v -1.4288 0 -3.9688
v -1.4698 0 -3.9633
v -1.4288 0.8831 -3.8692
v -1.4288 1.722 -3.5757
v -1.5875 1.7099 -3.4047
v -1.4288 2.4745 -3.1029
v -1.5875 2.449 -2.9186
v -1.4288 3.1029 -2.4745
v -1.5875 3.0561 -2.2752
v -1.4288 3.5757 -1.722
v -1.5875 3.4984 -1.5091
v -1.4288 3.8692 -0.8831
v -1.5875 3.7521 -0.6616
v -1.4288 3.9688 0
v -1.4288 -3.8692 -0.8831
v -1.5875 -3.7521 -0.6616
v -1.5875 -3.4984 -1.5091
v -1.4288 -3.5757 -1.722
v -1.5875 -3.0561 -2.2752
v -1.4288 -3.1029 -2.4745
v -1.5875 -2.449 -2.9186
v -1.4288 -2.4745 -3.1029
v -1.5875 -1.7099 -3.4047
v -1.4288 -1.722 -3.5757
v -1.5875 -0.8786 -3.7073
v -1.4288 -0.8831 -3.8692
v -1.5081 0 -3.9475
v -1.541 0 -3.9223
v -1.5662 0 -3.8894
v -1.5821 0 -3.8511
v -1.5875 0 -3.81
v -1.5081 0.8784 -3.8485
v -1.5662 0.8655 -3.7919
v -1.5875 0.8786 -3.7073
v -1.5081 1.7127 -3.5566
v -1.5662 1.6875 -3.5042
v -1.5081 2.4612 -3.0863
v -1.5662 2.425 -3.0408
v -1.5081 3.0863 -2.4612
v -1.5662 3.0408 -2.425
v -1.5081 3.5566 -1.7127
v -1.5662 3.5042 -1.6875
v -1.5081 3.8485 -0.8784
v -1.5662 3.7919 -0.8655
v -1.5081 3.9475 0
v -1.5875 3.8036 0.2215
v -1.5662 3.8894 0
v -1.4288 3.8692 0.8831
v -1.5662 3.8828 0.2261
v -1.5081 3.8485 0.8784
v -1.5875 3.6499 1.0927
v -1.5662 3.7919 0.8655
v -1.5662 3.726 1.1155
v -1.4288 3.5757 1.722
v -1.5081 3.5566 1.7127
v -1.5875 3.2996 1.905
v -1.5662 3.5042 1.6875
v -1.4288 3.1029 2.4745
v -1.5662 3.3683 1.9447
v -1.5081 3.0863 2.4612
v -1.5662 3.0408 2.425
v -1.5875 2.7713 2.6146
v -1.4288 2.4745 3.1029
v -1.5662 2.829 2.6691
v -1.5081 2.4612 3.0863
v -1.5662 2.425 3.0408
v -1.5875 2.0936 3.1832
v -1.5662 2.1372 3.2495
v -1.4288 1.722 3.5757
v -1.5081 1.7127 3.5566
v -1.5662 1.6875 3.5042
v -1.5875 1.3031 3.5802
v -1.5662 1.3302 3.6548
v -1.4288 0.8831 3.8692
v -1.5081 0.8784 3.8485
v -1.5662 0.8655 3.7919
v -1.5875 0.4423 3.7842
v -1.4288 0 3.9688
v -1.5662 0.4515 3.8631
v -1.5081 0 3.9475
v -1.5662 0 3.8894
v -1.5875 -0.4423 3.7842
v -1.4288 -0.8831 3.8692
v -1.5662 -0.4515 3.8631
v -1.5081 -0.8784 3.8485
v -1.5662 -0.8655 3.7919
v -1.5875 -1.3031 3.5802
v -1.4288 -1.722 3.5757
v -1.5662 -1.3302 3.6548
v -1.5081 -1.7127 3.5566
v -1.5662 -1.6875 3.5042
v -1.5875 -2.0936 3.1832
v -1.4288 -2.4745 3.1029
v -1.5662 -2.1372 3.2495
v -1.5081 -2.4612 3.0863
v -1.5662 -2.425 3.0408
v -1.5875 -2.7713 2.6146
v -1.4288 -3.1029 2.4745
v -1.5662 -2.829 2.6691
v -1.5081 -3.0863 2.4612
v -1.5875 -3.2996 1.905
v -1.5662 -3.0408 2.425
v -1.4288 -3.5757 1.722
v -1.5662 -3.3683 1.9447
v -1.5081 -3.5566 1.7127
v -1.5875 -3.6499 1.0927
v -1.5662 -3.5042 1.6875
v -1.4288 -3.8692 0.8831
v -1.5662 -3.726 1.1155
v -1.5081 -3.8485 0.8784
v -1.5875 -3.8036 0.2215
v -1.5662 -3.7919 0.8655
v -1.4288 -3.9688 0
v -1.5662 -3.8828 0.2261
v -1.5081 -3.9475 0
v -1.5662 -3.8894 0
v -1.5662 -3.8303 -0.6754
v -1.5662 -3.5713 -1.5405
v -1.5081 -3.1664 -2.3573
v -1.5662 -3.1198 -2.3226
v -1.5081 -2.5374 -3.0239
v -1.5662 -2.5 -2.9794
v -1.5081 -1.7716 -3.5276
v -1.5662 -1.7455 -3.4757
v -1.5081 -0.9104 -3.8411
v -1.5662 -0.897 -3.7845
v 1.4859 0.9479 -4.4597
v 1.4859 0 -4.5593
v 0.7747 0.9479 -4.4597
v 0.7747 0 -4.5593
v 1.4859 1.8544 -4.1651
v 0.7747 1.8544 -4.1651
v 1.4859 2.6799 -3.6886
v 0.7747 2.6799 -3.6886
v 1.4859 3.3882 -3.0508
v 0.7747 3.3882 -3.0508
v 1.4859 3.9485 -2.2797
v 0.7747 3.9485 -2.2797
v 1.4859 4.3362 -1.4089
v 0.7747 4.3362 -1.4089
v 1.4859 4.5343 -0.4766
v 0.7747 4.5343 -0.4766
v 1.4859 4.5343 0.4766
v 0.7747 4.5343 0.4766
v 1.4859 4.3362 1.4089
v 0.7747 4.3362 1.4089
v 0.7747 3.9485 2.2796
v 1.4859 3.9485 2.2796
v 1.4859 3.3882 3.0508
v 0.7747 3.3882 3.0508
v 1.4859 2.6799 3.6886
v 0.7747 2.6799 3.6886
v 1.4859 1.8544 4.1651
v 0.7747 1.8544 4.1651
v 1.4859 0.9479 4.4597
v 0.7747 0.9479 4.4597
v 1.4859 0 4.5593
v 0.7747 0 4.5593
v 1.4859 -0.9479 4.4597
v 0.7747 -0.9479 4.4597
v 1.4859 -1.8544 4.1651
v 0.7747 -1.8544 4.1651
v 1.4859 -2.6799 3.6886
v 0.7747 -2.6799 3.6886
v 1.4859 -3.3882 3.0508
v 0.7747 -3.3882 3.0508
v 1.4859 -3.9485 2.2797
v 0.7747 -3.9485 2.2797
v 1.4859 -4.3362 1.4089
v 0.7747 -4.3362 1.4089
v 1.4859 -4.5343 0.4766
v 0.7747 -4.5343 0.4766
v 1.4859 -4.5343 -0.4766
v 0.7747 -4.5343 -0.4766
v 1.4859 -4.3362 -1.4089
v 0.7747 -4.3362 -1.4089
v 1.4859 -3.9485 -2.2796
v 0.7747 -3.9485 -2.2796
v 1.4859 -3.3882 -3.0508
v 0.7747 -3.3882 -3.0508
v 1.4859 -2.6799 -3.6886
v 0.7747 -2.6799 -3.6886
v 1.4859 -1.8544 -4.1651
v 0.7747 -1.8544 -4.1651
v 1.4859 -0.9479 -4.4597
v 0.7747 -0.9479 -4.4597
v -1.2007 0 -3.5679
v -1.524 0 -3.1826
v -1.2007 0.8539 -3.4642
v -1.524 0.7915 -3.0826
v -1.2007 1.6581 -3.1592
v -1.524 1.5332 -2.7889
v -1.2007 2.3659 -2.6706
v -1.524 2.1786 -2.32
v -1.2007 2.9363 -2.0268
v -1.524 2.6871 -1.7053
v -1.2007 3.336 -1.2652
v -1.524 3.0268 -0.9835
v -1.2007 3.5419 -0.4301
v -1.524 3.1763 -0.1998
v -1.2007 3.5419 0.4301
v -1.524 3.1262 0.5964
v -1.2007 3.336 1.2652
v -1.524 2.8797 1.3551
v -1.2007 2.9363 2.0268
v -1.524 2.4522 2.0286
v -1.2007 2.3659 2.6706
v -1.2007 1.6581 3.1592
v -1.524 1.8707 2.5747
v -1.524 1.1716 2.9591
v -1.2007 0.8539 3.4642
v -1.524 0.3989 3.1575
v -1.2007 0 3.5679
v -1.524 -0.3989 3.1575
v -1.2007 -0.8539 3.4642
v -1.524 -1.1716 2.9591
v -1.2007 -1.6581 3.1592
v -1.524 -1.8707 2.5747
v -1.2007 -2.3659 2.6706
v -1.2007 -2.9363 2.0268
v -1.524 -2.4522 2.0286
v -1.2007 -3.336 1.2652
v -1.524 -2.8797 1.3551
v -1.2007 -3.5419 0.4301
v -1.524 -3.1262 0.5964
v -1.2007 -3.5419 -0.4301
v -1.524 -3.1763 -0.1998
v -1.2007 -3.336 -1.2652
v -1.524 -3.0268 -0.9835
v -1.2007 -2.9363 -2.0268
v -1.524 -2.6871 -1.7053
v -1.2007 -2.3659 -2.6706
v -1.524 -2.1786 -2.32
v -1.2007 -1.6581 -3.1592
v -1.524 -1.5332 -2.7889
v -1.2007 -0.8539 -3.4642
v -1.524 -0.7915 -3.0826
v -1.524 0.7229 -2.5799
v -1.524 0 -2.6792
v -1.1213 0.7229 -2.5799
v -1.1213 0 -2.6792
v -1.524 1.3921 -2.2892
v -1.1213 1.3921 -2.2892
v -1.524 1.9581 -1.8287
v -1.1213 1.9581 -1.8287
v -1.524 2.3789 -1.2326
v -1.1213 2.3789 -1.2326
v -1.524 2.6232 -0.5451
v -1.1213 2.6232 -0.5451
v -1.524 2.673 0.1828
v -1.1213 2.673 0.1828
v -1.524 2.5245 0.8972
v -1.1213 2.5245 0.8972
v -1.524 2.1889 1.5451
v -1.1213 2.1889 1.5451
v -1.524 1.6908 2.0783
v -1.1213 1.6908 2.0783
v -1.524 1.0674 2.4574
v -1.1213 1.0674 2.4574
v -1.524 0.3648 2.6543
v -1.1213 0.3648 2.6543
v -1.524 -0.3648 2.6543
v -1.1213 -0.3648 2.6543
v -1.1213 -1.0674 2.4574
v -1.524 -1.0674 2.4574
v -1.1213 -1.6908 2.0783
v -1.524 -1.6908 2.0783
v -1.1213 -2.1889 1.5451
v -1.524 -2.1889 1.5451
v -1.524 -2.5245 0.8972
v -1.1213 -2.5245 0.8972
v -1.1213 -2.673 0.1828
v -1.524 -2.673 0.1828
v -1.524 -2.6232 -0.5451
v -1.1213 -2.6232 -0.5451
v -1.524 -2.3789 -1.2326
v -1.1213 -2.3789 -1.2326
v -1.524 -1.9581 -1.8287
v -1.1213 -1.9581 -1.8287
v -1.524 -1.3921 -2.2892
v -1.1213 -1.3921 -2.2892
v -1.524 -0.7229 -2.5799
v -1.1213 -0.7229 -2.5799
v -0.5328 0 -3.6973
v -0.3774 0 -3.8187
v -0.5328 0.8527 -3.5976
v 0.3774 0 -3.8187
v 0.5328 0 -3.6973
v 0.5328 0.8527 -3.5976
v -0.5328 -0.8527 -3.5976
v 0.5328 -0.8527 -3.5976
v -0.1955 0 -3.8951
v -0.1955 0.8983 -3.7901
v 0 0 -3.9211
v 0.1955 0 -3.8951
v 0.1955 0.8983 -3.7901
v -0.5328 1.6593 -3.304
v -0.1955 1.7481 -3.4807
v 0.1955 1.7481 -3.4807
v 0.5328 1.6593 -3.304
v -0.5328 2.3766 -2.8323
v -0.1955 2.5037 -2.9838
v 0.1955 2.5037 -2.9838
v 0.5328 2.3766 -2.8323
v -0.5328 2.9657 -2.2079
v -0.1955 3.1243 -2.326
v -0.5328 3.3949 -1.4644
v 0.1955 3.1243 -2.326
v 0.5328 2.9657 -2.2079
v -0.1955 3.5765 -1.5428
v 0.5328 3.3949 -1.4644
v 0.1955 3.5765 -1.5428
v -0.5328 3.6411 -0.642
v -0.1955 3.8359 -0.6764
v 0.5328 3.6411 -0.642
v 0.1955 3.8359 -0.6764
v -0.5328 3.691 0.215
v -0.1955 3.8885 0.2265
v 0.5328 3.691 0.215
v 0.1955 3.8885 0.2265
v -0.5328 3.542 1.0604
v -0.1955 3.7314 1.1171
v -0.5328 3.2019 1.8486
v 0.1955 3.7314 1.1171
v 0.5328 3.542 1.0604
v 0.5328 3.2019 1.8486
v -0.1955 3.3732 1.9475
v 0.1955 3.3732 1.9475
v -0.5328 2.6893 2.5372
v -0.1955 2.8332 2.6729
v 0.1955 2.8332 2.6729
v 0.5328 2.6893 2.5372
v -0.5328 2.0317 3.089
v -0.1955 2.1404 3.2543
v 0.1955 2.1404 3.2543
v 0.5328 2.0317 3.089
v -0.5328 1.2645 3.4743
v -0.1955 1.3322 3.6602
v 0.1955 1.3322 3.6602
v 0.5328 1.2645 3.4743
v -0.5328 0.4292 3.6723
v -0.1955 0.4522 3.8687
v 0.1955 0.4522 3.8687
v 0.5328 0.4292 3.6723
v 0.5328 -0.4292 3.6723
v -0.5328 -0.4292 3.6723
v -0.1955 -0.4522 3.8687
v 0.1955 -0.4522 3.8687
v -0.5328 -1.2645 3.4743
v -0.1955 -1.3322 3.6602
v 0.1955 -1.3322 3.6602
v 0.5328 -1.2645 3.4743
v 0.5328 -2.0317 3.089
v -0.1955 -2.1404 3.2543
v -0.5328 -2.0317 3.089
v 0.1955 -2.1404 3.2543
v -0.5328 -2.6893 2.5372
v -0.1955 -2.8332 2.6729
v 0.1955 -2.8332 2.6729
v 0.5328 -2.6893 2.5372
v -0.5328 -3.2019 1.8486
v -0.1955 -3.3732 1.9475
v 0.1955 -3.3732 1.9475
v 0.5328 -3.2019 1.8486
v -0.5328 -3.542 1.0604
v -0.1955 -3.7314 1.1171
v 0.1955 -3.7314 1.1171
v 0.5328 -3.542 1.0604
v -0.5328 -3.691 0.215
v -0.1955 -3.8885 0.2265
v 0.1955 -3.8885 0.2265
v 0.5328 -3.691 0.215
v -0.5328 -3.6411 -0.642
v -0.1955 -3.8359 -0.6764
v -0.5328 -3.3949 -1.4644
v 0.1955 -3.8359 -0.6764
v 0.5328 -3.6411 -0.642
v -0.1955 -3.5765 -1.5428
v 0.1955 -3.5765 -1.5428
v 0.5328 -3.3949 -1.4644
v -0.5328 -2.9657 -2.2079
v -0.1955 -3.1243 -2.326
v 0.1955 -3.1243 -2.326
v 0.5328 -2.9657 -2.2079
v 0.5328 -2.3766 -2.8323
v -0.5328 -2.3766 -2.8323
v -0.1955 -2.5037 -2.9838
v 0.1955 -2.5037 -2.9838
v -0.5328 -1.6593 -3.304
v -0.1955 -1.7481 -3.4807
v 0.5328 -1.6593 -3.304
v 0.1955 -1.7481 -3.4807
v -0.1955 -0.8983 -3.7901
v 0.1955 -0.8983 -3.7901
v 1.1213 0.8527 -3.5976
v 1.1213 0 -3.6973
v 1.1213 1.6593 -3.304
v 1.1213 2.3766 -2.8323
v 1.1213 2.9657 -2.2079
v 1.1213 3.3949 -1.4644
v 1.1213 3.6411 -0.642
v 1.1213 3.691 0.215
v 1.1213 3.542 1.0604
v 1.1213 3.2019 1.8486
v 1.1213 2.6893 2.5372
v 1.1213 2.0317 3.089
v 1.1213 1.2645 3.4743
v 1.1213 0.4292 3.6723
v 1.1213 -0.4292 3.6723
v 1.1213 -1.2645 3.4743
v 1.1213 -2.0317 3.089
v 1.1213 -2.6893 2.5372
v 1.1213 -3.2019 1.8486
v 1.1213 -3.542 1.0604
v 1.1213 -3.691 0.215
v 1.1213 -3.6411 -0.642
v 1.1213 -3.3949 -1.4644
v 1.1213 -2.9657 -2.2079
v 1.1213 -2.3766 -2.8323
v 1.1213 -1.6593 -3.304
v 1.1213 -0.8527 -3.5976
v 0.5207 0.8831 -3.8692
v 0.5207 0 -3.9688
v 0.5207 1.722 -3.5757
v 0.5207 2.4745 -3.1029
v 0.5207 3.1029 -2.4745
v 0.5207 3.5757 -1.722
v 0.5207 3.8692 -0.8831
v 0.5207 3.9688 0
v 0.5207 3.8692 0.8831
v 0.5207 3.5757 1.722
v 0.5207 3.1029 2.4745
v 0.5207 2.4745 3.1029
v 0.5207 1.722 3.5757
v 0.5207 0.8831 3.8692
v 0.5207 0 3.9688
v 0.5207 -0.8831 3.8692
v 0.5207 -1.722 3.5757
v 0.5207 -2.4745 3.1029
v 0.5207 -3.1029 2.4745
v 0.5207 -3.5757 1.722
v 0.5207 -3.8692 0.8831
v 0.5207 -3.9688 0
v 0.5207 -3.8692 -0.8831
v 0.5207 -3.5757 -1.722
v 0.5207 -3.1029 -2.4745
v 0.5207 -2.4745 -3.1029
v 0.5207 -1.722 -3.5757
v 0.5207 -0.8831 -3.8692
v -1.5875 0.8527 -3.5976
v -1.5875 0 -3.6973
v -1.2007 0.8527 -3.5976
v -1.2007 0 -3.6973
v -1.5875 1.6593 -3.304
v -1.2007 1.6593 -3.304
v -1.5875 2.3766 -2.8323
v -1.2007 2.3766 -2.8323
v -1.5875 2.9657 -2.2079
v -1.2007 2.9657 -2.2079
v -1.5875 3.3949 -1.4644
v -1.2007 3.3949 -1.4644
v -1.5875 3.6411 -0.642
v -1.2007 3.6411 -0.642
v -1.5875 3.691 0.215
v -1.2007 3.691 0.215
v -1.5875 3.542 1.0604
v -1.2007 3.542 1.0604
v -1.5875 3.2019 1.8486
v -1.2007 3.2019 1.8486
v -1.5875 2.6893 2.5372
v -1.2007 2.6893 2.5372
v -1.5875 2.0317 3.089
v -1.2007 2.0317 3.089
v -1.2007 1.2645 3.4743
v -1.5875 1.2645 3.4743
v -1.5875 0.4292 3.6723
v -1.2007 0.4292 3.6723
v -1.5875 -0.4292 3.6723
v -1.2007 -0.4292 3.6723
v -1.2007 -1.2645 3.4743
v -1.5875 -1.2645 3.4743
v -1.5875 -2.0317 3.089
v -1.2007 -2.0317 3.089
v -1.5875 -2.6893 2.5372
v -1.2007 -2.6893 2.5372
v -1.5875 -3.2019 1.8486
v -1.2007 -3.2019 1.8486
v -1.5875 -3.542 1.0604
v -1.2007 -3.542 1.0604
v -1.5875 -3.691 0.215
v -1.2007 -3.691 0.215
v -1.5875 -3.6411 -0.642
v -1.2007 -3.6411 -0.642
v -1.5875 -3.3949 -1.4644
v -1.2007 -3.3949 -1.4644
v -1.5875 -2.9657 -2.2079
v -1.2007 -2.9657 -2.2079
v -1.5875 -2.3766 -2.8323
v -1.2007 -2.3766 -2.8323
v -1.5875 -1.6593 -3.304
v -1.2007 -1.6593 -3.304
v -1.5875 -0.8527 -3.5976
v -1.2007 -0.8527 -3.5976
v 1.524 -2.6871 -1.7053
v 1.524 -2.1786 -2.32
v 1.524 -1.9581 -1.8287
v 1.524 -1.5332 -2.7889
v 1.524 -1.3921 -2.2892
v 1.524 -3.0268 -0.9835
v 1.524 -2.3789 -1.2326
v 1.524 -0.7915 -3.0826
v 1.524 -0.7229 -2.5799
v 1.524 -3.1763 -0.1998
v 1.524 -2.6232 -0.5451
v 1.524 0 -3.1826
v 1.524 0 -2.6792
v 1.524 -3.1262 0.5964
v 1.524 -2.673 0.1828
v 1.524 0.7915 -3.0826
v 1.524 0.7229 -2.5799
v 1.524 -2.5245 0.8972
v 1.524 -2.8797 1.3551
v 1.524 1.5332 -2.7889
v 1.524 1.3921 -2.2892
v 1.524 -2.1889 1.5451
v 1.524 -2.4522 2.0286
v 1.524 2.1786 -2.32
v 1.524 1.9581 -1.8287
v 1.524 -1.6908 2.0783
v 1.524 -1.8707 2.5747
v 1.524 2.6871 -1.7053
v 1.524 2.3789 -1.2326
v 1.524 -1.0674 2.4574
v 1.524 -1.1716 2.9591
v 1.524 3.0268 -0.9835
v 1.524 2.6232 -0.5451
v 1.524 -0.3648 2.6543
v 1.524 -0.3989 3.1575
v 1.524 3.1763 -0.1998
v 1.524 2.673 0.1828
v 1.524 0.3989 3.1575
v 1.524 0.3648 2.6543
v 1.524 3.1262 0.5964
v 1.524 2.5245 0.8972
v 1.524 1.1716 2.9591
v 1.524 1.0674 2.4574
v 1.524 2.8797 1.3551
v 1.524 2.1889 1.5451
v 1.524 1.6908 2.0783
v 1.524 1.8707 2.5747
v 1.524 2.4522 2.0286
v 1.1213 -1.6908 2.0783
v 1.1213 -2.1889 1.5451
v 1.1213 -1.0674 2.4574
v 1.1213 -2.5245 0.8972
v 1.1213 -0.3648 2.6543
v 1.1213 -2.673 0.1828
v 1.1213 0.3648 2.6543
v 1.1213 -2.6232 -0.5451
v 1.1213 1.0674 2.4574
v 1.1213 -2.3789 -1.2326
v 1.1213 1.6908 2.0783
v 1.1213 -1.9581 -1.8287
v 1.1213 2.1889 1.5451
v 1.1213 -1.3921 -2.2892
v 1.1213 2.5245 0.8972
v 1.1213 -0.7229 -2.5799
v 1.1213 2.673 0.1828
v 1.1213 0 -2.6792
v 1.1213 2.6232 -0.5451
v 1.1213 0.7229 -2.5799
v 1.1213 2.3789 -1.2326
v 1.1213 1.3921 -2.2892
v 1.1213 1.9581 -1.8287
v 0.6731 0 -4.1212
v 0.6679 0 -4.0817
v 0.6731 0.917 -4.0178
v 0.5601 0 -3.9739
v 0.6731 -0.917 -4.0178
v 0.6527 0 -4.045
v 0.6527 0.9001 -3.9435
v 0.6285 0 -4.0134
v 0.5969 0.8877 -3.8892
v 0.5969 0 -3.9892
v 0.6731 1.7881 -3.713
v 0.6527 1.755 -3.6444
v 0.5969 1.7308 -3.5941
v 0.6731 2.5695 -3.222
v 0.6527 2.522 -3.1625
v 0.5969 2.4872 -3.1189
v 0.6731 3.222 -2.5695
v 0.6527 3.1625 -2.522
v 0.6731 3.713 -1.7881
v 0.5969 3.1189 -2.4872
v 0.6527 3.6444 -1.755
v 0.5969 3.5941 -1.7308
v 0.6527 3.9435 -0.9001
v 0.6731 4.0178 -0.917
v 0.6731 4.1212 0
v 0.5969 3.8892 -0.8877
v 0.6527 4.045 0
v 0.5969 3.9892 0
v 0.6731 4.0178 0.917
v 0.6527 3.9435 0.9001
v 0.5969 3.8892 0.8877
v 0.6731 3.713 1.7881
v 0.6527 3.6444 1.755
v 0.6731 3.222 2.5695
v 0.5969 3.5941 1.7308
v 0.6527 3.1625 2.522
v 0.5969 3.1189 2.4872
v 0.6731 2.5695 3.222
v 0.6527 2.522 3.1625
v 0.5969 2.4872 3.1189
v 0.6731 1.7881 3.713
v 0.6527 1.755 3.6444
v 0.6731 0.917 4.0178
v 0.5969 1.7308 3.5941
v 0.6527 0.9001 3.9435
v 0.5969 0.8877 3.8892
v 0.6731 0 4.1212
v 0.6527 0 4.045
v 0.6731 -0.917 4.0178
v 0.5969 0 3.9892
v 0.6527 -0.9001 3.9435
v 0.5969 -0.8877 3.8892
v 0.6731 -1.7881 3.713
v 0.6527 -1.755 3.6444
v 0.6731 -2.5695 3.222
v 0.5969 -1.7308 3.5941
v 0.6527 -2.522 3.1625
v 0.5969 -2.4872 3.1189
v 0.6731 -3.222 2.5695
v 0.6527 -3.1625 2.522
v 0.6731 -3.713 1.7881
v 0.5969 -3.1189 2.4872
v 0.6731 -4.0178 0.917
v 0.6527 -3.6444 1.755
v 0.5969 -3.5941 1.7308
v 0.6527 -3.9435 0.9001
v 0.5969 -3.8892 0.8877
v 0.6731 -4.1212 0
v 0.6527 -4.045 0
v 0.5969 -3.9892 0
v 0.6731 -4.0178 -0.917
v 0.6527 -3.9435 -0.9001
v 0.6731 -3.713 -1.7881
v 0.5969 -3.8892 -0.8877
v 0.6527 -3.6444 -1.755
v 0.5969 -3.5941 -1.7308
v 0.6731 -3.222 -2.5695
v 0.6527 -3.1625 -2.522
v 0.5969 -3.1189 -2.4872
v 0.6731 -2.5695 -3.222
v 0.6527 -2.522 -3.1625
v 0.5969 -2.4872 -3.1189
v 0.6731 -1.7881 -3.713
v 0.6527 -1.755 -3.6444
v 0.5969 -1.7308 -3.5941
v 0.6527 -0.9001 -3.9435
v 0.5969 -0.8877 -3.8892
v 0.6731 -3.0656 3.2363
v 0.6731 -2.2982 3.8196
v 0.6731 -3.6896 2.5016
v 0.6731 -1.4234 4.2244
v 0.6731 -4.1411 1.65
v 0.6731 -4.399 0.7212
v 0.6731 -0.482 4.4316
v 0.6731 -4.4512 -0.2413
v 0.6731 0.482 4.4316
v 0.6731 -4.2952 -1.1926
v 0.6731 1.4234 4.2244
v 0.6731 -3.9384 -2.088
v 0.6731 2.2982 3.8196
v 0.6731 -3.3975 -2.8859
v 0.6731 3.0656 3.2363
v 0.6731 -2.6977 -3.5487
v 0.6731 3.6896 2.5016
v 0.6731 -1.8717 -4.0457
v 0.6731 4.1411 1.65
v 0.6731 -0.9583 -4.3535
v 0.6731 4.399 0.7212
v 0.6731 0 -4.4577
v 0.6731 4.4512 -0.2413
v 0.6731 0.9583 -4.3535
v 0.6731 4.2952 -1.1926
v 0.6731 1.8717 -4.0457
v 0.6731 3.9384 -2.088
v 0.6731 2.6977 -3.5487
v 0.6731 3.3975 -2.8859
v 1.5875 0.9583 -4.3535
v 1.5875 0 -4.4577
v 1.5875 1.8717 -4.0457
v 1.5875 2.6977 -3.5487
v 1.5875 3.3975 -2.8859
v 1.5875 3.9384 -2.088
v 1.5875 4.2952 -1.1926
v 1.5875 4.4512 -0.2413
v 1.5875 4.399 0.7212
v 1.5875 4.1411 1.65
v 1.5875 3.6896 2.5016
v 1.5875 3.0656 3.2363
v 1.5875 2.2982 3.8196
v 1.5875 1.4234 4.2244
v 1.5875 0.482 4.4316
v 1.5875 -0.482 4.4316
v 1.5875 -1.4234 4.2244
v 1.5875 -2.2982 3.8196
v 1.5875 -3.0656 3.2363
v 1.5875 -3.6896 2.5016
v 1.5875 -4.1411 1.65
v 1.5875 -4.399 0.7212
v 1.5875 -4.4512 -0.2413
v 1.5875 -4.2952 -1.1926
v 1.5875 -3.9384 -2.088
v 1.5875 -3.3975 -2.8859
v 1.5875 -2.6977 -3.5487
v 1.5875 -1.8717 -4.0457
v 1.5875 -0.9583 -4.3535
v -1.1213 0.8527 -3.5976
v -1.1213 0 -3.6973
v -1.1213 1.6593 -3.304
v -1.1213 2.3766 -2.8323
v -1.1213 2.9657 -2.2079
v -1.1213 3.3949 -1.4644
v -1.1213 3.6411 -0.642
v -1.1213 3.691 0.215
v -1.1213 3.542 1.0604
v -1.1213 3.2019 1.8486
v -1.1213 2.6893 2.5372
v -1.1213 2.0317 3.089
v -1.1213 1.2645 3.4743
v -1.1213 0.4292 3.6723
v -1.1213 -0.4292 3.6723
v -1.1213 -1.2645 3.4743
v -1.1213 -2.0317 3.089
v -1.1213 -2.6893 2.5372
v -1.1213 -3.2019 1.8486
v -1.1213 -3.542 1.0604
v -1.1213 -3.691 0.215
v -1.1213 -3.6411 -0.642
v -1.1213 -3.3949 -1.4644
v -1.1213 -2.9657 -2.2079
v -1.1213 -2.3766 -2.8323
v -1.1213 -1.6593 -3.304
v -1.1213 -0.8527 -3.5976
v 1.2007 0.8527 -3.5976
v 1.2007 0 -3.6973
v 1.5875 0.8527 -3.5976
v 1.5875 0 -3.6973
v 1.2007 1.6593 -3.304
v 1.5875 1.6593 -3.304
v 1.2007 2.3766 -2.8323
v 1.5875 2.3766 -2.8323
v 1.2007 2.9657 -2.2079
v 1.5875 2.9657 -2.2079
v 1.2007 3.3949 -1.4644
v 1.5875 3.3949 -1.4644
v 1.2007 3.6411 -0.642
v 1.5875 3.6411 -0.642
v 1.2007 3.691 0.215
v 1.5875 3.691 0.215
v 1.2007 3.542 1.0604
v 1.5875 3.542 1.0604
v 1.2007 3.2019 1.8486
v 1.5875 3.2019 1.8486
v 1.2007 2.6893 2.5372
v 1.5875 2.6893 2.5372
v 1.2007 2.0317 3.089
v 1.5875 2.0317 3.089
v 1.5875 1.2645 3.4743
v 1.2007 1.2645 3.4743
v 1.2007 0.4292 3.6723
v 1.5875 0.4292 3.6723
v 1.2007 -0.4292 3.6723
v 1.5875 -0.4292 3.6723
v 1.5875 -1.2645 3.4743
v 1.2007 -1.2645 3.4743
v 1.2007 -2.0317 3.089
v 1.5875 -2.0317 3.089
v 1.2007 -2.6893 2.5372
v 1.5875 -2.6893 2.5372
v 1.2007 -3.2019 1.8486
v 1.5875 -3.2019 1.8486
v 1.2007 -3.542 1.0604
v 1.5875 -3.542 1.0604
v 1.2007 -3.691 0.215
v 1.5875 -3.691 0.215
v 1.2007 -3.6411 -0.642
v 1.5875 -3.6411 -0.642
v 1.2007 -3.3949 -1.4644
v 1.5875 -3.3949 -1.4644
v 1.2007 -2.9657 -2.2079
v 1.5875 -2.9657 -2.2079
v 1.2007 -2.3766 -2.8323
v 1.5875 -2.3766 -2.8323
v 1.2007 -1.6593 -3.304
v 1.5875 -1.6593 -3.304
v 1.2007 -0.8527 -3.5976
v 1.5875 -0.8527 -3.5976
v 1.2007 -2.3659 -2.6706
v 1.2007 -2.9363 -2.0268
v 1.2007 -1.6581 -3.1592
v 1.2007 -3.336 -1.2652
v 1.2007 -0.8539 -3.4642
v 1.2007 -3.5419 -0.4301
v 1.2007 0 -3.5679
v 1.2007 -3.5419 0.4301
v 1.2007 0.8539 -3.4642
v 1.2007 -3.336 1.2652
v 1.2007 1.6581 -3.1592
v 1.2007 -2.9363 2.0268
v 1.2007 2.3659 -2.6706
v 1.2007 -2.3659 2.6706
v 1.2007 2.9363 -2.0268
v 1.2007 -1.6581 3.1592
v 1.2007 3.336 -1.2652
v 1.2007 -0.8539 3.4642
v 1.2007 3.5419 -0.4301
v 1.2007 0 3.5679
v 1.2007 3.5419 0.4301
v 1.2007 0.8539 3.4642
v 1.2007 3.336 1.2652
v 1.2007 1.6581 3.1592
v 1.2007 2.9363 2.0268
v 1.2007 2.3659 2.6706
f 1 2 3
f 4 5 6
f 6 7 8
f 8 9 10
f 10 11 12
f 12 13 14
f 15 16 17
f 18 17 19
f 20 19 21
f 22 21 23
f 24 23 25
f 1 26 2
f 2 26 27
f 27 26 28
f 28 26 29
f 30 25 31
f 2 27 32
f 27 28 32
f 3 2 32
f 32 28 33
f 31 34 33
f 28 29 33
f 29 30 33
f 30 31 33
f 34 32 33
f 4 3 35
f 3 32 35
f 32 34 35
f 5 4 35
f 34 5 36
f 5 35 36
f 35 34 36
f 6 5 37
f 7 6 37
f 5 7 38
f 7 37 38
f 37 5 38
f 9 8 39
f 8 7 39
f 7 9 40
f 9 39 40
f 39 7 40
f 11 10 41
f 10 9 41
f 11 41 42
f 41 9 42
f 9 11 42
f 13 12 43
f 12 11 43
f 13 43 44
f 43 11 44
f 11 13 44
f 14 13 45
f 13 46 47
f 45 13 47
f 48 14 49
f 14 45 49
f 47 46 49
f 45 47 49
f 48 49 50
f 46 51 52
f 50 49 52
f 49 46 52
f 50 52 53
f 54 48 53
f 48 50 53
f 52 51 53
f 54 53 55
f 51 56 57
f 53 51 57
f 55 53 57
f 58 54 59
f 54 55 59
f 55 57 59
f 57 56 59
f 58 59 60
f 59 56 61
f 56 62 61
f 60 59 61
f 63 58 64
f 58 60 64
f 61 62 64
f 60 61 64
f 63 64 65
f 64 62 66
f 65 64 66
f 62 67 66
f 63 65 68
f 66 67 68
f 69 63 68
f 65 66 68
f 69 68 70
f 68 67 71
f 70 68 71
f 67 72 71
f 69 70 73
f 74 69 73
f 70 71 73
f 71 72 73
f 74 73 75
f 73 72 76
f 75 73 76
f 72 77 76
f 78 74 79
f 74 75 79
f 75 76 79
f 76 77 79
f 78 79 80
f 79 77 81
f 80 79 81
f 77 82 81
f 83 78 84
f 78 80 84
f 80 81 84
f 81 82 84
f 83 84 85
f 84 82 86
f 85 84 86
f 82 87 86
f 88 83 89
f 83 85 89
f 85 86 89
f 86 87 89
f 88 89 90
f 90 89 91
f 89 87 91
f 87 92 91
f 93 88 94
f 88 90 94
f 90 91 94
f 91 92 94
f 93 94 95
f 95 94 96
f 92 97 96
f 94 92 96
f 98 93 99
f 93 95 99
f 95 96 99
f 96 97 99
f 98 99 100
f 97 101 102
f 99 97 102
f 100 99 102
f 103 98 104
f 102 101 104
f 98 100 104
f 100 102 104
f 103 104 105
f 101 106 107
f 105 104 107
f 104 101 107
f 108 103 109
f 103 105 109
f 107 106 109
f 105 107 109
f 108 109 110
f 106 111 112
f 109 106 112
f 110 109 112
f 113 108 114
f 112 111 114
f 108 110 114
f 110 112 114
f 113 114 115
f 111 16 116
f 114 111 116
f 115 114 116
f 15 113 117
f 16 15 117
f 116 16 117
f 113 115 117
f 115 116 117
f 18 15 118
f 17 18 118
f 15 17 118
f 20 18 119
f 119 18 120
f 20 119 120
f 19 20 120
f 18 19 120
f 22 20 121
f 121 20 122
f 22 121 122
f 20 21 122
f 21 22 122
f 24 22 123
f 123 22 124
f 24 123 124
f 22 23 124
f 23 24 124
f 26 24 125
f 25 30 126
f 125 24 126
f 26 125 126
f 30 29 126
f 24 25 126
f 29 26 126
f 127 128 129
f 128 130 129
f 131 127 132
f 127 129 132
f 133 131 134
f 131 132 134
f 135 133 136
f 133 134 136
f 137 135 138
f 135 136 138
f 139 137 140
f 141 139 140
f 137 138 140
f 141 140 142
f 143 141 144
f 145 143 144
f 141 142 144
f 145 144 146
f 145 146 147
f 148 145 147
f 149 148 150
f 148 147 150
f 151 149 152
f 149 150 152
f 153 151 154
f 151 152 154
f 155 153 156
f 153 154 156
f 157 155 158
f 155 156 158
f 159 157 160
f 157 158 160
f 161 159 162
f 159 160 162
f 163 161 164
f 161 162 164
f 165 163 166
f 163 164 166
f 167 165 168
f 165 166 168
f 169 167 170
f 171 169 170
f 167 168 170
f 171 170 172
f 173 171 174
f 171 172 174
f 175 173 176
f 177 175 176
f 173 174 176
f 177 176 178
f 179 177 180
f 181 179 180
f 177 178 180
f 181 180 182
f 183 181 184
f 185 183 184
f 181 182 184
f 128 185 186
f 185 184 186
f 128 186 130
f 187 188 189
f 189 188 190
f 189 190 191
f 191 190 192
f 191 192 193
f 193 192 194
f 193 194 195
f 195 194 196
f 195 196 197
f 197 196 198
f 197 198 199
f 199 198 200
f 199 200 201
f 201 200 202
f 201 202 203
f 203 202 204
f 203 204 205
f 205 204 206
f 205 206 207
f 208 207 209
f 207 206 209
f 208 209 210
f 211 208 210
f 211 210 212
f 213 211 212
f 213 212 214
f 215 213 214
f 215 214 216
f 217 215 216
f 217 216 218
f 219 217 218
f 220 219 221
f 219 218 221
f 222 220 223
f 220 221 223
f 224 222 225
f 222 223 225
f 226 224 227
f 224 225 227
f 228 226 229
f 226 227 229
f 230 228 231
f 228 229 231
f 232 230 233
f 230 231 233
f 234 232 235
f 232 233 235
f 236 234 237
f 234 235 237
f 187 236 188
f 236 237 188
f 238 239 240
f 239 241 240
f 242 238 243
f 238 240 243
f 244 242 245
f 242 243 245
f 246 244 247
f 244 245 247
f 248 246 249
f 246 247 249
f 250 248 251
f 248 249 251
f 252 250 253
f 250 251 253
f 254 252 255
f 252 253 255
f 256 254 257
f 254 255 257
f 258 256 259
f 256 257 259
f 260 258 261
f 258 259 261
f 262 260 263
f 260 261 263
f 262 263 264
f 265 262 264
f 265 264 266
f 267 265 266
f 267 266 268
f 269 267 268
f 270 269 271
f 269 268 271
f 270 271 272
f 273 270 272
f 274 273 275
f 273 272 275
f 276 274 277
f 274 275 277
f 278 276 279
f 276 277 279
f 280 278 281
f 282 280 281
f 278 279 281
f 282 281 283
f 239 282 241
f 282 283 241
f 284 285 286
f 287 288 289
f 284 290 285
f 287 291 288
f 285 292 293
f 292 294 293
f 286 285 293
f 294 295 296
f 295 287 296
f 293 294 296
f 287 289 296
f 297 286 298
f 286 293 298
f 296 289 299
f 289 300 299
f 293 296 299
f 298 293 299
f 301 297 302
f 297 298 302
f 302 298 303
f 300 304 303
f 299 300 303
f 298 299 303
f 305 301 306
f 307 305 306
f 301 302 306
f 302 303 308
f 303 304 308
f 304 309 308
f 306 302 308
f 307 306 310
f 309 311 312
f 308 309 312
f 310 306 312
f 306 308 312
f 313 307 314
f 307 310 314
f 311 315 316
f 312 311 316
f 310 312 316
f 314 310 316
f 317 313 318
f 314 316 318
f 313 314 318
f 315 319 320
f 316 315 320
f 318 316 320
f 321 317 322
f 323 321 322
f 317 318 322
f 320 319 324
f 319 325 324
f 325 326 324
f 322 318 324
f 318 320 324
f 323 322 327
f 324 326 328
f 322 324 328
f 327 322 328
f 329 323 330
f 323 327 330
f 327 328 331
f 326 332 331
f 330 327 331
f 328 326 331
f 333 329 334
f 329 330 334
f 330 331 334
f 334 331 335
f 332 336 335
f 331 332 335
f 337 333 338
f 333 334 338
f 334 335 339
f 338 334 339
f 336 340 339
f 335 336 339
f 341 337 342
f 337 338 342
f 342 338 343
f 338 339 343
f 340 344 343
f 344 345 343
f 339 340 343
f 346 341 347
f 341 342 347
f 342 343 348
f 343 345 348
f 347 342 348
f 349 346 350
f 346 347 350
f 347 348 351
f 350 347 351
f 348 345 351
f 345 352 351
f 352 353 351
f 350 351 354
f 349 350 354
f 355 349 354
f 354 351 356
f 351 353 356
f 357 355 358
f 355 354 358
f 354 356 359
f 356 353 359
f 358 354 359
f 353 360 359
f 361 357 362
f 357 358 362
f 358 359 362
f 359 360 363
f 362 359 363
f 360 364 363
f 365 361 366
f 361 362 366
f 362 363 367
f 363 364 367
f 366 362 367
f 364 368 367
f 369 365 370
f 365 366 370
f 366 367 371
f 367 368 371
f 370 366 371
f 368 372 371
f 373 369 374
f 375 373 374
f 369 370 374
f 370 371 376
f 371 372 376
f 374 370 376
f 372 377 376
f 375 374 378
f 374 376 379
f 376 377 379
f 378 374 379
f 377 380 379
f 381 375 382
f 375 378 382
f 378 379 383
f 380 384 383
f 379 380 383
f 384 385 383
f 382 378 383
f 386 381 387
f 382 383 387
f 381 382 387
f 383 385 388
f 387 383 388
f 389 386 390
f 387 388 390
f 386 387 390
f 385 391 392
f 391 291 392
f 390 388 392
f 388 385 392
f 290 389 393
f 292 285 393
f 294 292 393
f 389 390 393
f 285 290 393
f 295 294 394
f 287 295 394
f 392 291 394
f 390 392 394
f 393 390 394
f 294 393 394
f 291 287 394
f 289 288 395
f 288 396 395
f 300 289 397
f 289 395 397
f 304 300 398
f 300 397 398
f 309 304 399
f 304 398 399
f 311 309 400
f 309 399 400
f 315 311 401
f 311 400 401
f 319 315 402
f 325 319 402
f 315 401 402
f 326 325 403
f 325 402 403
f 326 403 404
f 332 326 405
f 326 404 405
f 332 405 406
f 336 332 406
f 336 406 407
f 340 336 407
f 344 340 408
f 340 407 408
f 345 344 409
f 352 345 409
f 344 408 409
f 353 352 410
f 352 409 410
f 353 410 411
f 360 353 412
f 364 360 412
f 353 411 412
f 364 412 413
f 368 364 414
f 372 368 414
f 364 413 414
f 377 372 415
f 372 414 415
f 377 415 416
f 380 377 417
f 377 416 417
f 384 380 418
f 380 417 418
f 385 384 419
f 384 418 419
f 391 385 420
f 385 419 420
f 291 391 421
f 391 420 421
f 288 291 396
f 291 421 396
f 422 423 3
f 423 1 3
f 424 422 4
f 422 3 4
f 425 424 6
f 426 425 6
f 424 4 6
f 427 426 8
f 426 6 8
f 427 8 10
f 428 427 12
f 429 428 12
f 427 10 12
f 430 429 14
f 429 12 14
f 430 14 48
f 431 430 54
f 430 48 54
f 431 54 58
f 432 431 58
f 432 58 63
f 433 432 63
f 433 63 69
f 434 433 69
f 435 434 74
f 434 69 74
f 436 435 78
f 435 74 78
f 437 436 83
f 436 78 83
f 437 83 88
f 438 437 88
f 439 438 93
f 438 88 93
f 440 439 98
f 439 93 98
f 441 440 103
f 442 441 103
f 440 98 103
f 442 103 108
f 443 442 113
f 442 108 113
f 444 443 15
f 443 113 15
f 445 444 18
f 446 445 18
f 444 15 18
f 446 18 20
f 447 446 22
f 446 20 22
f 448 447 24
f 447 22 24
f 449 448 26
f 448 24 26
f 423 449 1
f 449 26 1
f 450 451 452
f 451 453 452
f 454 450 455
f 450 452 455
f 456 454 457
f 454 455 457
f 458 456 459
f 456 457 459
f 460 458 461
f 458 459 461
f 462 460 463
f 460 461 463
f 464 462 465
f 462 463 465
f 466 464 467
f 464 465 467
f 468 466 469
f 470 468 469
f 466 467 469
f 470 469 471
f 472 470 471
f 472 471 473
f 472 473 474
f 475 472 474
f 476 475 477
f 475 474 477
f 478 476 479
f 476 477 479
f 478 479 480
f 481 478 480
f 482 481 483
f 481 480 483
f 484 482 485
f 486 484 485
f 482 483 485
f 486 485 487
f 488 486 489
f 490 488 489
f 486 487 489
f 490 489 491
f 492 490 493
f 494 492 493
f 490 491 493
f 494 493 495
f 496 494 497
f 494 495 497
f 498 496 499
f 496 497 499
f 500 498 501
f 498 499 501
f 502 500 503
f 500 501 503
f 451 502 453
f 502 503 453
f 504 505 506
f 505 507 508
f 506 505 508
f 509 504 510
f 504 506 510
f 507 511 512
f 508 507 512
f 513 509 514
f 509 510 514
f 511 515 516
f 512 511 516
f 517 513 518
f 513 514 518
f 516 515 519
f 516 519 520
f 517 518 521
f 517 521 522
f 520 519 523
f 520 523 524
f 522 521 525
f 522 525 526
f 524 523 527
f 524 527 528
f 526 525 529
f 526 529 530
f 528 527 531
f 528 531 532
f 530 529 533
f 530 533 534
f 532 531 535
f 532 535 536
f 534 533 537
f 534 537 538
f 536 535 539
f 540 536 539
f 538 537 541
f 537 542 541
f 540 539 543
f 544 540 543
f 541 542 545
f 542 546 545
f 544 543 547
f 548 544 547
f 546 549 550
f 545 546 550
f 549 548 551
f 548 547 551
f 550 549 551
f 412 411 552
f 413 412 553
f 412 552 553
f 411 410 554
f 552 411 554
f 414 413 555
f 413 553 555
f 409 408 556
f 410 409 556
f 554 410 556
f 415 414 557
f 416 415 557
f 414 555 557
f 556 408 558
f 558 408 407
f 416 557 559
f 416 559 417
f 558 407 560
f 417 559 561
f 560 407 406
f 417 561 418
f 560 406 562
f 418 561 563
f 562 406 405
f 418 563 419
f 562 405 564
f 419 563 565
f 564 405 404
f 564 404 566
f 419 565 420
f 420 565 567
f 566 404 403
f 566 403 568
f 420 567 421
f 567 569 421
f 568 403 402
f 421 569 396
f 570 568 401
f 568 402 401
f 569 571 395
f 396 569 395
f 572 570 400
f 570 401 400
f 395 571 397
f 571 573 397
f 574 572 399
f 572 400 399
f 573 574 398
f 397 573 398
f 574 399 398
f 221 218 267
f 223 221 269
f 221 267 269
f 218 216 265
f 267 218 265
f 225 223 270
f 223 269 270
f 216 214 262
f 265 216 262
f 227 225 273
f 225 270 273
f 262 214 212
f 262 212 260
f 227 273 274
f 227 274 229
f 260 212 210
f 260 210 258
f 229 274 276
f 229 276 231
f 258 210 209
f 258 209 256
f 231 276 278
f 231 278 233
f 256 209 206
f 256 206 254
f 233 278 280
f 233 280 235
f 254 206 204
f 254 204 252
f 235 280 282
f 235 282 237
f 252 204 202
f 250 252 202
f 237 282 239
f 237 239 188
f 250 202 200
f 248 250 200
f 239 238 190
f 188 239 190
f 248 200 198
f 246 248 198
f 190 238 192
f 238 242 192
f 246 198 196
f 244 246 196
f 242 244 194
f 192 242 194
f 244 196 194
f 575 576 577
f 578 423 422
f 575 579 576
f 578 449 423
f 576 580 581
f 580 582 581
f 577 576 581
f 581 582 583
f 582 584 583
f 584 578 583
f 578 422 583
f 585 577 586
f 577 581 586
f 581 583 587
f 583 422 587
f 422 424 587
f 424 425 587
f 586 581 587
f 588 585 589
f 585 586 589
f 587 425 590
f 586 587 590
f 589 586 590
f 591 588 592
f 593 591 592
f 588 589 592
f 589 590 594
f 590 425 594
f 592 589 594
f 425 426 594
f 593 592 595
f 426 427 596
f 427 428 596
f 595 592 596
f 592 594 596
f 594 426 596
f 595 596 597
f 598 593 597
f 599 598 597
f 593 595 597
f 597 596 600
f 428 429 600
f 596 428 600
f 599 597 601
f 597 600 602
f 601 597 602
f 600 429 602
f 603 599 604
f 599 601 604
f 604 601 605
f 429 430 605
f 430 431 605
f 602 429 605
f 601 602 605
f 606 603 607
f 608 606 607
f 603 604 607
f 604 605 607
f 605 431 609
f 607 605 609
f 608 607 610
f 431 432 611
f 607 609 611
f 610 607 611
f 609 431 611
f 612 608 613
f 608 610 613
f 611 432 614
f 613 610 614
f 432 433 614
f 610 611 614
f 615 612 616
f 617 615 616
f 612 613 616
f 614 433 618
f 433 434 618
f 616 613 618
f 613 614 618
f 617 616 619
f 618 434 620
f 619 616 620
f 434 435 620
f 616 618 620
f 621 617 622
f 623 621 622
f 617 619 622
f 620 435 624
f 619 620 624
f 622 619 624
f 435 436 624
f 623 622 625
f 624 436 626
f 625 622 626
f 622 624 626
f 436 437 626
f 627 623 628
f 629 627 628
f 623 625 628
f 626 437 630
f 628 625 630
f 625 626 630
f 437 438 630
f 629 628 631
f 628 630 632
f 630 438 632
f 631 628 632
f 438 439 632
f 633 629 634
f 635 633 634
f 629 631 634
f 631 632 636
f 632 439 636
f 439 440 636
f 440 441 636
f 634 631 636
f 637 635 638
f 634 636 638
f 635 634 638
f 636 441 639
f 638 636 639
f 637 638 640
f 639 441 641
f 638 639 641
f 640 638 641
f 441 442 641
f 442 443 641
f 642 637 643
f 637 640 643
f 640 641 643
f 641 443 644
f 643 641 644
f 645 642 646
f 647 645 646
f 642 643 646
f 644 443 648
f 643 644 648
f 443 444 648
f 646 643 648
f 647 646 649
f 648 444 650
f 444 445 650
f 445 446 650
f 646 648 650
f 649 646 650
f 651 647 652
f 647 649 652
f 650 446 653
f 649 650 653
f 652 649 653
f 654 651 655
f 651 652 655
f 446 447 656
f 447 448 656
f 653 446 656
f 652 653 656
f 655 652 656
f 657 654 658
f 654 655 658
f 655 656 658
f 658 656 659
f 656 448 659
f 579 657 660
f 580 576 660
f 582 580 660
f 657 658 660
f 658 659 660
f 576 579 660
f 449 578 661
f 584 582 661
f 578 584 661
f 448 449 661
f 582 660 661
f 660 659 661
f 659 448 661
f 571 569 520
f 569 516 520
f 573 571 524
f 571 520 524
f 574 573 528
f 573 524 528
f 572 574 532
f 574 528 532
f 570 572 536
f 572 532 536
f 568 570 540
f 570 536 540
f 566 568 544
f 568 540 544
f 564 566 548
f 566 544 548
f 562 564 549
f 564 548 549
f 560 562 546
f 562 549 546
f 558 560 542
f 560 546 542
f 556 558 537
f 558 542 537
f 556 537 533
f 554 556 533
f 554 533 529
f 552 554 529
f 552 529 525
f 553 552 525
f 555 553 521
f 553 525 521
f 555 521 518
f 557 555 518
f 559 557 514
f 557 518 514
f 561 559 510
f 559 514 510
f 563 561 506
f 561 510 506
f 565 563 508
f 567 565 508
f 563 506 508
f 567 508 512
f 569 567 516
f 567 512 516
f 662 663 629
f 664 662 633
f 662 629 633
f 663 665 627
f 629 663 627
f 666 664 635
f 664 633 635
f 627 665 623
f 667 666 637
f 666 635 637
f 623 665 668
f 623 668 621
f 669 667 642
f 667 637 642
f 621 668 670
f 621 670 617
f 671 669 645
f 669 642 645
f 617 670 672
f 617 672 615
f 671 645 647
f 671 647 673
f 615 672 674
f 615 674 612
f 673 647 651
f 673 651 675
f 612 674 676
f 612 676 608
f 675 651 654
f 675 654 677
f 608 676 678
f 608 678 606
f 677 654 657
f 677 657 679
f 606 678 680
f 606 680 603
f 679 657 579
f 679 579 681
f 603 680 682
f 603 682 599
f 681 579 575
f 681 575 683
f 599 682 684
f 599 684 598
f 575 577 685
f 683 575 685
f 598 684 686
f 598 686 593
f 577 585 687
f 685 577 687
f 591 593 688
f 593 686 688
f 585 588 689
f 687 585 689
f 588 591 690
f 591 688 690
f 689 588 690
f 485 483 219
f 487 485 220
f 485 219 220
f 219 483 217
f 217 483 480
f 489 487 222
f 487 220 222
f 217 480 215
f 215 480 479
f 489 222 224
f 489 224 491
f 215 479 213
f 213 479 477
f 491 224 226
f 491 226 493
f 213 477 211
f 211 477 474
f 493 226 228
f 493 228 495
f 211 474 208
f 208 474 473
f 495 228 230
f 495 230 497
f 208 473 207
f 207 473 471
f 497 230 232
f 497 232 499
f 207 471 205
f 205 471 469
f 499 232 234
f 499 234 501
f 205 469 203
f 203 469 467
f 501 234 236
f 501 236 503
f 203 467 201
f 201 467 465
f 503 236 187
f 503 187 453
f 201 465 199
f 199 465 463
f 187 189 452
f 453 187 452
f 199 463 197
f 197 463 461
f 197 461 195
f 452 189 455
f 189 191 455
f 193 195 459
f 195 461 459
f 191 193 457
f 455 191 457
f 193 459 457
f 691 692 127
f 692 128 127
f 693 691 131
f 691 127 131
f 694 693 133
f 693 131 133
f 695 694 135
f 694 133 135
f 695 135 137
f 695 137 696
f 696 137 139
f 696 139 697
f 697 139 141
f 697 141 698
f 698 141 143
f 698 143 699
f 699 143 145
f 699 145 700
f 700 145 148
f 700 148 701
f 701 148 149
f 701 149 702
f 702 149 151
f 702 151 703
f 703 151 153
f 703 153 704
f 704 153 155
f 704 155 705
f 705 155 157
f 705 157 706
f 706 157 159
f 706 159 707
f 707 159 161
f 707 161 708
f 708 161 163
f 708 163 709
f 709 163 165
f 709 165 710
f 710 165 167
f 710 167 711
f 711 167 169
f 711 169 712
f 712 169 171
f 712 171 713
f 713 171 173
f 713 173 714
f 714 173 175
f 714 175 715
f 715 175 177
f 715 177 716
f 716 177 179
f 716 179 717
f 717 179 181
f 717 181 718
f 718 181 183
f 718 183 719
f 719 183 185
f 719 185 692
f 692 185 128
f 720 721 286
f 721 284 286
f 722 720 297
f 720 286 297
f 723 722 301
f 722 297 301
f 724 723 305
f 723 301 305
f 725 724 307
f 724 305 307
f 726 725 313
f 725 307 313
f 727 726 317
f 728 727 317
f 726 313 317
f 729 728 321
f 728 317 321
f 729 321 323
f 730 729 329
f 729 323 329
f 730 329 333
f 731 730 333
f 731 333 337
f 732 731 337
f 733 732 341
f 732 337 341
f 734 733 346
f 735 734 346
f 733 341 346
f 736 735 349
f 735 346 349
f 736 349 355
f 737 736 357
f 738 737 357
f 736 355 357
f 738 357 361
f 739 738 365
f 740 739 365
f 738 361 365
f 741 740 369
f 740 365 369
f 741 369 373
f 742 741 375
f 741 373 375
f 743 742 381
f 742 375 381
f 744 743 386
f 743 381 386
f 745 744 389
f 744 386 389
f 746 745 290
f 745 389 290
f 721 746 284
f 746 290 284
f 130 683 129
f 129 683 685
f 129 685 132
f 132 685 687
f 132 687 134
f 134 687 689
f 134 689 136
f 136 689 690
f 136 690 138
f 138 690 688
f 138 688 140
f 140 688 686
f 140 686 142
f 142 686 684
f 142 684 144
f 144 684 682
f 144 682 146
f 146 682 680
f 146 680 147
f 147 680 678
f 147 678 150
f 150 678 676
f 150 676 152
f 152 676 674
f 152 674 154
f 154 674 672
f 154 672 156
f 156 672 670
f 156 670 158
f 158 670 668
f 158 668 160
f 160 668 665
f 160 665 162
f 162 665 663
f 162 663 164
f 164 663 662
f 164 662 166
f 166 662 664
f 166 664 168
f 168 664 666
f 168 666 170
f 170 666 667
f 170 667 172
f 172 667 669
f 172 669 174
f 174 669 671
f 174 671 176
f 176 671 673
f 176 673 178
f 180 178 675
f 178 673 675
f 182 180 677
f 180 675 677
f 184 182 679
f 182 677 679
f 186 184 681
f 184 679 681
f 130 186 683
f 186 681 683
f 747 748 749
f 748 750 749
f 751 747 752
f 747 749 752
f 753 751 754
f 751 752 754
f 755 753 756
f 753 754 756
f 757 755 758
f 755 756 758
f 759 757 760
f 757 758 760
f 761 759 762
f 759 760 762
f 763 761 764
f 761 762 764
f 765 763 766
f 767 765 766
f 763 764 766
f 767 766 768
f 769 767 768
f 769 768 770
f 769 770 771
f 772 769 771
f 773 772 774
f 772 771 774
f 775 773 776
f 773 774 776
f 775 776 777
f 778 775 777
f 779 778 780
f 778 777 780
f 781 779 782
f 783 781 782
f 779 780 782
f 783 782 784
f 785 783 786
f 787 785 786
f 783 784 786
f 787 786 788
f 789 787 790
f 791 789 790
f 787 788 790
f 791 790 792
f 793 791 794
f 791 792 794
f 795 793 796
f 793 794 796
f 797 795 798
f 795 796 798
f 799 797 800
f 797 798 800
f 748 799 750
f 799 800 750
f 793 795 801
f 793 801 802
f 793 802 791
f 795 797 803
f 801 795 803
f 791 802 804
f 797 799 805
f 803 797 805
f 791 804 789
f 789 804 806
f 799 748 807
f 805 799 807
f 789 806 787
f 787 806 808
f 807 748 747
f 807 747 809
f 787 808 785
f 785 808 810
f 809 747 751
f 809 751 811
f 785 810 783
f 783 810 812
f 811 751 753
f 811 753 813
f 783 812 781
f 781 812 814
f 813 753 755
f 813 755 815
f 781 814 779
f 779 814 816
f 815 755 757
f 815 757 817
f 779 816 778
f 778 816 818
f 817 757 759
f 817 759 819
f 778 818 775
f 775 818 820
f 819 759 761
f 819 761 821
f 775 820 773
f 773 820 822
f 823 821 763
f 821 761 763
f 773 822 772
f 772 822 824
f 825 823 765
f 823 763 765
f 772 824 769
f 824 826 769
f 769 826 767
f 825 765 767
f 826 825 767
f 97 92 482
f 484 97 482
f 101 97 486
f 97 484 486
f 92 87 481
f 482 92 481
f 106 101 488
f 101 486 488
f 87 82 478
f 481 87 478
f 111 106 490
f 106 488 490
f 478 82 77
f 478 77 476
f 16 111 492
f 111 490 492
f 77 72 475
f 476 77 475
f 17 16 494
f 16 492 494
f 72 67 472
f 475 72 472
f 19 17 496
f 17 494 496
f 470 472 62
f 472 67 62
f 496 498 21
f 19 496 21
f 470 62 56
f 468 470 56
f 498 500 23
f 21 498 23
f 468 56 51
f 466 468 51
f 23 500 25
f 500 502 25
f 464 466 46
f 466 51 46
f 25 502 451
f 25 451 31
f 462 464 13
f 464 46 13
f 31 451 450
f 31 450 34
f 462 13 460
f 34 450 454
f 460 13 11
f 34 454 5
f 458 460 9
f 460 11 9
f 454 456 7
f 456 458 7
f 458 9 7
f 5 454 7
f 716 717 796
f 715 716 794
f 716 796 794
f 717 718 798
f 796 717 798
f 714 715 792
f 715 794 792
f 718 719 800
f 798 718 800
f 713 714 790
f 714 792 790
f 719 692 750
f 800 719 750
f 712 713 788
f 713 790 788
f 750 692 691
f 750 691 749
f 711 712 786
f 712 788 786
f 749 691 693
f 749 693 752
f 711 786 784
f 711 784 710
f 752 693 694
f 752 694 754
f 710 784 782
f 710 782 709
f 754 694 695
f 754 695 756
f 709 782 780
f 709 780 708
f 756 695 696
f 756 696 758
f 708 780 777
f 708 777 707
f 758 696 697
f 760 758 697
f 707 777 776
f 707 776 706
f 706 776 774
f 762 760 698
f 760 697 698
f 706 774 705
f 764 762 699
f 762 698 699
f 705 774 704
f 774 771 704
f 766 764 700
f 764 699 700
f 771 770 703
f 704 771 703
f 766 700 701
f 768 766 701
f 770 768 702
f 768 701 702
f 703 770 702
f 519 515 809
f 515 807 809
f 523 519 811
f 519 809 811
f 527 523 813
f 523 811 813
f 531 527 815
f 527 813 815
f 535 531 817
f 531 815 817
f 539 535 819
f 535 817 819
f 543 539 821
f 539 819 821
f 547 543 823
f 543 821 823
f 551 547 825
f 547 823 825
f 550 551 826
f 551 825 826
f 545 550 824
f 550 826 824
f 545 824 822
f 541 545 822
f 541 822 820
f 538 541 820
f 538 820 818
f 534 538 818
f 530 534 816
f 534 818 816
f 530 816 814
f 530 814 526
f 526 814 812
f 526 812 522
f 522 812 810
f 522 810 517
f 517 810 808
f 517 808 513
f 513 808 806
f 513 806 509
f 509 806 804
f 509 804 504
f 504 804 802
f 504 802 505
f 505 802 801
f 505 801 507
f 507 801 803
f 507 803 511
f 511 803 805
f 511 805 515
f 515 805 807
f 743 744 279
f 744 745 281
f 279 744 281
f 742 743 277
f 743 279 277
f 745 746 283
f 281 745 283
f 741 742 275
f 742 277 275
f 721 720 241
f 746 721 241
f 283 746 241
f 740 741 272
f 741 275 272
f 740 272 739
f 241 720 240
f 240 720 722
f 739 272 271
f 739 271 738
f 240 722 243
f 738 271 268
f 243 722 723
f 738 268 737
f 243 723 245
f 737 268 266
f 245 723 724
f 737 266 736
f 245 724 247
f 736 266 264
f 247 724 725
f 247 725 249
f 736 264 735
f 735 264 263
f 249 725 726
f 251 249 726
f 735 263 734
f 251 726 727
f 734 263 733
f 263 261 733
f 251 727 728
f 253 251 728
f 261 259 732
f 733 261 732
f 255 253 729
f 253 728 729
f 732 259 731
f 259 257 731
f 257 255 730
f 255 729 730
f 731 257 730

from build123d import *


with BuildPart() as part:
    # Sketch1 → Revolve1 (revolve)
    with BuildSketch(Plane.XY, mode=Mode.PRIVATE) as revolve1_sk:
        with BuildLine():
            Line((0.532839829, 3.6972875), (1.121293646, 3.6972875))
            Line((1.121293646, 3.6972875), (1.121293646, 2.679239625))
            Line((1.121293646, 2.679239625), (1.524, 2.679239625))
            Line((1.524, 2.679239625), (1.524, 3.182551134))
            Line((1.524, 3.182551134), (1.200668646, 3.567882437))
            Line((1.200668646, 3.567882437), (1.200668646, 3.6972875))
            Line((1.200668646, 3.6972875), (1.5875, 3.6972875))
            Line((1.5875, 3.6972875), (1.5875, 4.4577))
            Line((1.5875, 4.4577), (1.4859, 4.5593))
            Line((1.4859, 4.5593), (0.7747, 4.5593))
            Line((0.7747, 4.5593), (0.6731, 4.4577))
            Line((0.6731, 4.4577), (0.6731, 4.12115))
            ThreePointArc((0.6731, 4.12115), (0.628463073, 4.013386927), (0.5207, 3.96875))
            Line((0.5207, 3.96875), (-1.42875, 3.96875))
            ThreePointArc((-1.42875, 3.96875), (-1.541003202, 3.922253202), (-1.5875, 3.81))
            Line((-1.5875, 3.81), (-1.5875, 3.6972875))
            Line((-1.5875, 3.6972875), (-1.200668646, 3.6972875))
            Line((-1.200668646, 3.6972875), (-1.200668646, 3.567882438))
            Line((-1.200668646, 3.567882438), (-1.524, 3.182551134))
            Line((-1.524, 3.182551134), (-1.524, 2.679239625))
            Line((-1.524, 2.679239625), (-1.121293646, 2.679239625))
            Line((-1.121293646, 2.679239625), (-1.121293646, 3.6972875))
            Line((-1.121293646, 3.6972875), (-0.532839829, 3.6972875))
            ThreePointArc((-0.532839829, 3.6972875), (0, 3.921125), (0.532839829, 3.6972875))
        make_face()
    revolve(revolve1_sk.sketch.rotate(Axis((-1.5875, 0, 0), (1, 0, 0)), 270), axis=Axis((-1.5875, 0, 0), (1, 0, 0)))


solid = part.part
